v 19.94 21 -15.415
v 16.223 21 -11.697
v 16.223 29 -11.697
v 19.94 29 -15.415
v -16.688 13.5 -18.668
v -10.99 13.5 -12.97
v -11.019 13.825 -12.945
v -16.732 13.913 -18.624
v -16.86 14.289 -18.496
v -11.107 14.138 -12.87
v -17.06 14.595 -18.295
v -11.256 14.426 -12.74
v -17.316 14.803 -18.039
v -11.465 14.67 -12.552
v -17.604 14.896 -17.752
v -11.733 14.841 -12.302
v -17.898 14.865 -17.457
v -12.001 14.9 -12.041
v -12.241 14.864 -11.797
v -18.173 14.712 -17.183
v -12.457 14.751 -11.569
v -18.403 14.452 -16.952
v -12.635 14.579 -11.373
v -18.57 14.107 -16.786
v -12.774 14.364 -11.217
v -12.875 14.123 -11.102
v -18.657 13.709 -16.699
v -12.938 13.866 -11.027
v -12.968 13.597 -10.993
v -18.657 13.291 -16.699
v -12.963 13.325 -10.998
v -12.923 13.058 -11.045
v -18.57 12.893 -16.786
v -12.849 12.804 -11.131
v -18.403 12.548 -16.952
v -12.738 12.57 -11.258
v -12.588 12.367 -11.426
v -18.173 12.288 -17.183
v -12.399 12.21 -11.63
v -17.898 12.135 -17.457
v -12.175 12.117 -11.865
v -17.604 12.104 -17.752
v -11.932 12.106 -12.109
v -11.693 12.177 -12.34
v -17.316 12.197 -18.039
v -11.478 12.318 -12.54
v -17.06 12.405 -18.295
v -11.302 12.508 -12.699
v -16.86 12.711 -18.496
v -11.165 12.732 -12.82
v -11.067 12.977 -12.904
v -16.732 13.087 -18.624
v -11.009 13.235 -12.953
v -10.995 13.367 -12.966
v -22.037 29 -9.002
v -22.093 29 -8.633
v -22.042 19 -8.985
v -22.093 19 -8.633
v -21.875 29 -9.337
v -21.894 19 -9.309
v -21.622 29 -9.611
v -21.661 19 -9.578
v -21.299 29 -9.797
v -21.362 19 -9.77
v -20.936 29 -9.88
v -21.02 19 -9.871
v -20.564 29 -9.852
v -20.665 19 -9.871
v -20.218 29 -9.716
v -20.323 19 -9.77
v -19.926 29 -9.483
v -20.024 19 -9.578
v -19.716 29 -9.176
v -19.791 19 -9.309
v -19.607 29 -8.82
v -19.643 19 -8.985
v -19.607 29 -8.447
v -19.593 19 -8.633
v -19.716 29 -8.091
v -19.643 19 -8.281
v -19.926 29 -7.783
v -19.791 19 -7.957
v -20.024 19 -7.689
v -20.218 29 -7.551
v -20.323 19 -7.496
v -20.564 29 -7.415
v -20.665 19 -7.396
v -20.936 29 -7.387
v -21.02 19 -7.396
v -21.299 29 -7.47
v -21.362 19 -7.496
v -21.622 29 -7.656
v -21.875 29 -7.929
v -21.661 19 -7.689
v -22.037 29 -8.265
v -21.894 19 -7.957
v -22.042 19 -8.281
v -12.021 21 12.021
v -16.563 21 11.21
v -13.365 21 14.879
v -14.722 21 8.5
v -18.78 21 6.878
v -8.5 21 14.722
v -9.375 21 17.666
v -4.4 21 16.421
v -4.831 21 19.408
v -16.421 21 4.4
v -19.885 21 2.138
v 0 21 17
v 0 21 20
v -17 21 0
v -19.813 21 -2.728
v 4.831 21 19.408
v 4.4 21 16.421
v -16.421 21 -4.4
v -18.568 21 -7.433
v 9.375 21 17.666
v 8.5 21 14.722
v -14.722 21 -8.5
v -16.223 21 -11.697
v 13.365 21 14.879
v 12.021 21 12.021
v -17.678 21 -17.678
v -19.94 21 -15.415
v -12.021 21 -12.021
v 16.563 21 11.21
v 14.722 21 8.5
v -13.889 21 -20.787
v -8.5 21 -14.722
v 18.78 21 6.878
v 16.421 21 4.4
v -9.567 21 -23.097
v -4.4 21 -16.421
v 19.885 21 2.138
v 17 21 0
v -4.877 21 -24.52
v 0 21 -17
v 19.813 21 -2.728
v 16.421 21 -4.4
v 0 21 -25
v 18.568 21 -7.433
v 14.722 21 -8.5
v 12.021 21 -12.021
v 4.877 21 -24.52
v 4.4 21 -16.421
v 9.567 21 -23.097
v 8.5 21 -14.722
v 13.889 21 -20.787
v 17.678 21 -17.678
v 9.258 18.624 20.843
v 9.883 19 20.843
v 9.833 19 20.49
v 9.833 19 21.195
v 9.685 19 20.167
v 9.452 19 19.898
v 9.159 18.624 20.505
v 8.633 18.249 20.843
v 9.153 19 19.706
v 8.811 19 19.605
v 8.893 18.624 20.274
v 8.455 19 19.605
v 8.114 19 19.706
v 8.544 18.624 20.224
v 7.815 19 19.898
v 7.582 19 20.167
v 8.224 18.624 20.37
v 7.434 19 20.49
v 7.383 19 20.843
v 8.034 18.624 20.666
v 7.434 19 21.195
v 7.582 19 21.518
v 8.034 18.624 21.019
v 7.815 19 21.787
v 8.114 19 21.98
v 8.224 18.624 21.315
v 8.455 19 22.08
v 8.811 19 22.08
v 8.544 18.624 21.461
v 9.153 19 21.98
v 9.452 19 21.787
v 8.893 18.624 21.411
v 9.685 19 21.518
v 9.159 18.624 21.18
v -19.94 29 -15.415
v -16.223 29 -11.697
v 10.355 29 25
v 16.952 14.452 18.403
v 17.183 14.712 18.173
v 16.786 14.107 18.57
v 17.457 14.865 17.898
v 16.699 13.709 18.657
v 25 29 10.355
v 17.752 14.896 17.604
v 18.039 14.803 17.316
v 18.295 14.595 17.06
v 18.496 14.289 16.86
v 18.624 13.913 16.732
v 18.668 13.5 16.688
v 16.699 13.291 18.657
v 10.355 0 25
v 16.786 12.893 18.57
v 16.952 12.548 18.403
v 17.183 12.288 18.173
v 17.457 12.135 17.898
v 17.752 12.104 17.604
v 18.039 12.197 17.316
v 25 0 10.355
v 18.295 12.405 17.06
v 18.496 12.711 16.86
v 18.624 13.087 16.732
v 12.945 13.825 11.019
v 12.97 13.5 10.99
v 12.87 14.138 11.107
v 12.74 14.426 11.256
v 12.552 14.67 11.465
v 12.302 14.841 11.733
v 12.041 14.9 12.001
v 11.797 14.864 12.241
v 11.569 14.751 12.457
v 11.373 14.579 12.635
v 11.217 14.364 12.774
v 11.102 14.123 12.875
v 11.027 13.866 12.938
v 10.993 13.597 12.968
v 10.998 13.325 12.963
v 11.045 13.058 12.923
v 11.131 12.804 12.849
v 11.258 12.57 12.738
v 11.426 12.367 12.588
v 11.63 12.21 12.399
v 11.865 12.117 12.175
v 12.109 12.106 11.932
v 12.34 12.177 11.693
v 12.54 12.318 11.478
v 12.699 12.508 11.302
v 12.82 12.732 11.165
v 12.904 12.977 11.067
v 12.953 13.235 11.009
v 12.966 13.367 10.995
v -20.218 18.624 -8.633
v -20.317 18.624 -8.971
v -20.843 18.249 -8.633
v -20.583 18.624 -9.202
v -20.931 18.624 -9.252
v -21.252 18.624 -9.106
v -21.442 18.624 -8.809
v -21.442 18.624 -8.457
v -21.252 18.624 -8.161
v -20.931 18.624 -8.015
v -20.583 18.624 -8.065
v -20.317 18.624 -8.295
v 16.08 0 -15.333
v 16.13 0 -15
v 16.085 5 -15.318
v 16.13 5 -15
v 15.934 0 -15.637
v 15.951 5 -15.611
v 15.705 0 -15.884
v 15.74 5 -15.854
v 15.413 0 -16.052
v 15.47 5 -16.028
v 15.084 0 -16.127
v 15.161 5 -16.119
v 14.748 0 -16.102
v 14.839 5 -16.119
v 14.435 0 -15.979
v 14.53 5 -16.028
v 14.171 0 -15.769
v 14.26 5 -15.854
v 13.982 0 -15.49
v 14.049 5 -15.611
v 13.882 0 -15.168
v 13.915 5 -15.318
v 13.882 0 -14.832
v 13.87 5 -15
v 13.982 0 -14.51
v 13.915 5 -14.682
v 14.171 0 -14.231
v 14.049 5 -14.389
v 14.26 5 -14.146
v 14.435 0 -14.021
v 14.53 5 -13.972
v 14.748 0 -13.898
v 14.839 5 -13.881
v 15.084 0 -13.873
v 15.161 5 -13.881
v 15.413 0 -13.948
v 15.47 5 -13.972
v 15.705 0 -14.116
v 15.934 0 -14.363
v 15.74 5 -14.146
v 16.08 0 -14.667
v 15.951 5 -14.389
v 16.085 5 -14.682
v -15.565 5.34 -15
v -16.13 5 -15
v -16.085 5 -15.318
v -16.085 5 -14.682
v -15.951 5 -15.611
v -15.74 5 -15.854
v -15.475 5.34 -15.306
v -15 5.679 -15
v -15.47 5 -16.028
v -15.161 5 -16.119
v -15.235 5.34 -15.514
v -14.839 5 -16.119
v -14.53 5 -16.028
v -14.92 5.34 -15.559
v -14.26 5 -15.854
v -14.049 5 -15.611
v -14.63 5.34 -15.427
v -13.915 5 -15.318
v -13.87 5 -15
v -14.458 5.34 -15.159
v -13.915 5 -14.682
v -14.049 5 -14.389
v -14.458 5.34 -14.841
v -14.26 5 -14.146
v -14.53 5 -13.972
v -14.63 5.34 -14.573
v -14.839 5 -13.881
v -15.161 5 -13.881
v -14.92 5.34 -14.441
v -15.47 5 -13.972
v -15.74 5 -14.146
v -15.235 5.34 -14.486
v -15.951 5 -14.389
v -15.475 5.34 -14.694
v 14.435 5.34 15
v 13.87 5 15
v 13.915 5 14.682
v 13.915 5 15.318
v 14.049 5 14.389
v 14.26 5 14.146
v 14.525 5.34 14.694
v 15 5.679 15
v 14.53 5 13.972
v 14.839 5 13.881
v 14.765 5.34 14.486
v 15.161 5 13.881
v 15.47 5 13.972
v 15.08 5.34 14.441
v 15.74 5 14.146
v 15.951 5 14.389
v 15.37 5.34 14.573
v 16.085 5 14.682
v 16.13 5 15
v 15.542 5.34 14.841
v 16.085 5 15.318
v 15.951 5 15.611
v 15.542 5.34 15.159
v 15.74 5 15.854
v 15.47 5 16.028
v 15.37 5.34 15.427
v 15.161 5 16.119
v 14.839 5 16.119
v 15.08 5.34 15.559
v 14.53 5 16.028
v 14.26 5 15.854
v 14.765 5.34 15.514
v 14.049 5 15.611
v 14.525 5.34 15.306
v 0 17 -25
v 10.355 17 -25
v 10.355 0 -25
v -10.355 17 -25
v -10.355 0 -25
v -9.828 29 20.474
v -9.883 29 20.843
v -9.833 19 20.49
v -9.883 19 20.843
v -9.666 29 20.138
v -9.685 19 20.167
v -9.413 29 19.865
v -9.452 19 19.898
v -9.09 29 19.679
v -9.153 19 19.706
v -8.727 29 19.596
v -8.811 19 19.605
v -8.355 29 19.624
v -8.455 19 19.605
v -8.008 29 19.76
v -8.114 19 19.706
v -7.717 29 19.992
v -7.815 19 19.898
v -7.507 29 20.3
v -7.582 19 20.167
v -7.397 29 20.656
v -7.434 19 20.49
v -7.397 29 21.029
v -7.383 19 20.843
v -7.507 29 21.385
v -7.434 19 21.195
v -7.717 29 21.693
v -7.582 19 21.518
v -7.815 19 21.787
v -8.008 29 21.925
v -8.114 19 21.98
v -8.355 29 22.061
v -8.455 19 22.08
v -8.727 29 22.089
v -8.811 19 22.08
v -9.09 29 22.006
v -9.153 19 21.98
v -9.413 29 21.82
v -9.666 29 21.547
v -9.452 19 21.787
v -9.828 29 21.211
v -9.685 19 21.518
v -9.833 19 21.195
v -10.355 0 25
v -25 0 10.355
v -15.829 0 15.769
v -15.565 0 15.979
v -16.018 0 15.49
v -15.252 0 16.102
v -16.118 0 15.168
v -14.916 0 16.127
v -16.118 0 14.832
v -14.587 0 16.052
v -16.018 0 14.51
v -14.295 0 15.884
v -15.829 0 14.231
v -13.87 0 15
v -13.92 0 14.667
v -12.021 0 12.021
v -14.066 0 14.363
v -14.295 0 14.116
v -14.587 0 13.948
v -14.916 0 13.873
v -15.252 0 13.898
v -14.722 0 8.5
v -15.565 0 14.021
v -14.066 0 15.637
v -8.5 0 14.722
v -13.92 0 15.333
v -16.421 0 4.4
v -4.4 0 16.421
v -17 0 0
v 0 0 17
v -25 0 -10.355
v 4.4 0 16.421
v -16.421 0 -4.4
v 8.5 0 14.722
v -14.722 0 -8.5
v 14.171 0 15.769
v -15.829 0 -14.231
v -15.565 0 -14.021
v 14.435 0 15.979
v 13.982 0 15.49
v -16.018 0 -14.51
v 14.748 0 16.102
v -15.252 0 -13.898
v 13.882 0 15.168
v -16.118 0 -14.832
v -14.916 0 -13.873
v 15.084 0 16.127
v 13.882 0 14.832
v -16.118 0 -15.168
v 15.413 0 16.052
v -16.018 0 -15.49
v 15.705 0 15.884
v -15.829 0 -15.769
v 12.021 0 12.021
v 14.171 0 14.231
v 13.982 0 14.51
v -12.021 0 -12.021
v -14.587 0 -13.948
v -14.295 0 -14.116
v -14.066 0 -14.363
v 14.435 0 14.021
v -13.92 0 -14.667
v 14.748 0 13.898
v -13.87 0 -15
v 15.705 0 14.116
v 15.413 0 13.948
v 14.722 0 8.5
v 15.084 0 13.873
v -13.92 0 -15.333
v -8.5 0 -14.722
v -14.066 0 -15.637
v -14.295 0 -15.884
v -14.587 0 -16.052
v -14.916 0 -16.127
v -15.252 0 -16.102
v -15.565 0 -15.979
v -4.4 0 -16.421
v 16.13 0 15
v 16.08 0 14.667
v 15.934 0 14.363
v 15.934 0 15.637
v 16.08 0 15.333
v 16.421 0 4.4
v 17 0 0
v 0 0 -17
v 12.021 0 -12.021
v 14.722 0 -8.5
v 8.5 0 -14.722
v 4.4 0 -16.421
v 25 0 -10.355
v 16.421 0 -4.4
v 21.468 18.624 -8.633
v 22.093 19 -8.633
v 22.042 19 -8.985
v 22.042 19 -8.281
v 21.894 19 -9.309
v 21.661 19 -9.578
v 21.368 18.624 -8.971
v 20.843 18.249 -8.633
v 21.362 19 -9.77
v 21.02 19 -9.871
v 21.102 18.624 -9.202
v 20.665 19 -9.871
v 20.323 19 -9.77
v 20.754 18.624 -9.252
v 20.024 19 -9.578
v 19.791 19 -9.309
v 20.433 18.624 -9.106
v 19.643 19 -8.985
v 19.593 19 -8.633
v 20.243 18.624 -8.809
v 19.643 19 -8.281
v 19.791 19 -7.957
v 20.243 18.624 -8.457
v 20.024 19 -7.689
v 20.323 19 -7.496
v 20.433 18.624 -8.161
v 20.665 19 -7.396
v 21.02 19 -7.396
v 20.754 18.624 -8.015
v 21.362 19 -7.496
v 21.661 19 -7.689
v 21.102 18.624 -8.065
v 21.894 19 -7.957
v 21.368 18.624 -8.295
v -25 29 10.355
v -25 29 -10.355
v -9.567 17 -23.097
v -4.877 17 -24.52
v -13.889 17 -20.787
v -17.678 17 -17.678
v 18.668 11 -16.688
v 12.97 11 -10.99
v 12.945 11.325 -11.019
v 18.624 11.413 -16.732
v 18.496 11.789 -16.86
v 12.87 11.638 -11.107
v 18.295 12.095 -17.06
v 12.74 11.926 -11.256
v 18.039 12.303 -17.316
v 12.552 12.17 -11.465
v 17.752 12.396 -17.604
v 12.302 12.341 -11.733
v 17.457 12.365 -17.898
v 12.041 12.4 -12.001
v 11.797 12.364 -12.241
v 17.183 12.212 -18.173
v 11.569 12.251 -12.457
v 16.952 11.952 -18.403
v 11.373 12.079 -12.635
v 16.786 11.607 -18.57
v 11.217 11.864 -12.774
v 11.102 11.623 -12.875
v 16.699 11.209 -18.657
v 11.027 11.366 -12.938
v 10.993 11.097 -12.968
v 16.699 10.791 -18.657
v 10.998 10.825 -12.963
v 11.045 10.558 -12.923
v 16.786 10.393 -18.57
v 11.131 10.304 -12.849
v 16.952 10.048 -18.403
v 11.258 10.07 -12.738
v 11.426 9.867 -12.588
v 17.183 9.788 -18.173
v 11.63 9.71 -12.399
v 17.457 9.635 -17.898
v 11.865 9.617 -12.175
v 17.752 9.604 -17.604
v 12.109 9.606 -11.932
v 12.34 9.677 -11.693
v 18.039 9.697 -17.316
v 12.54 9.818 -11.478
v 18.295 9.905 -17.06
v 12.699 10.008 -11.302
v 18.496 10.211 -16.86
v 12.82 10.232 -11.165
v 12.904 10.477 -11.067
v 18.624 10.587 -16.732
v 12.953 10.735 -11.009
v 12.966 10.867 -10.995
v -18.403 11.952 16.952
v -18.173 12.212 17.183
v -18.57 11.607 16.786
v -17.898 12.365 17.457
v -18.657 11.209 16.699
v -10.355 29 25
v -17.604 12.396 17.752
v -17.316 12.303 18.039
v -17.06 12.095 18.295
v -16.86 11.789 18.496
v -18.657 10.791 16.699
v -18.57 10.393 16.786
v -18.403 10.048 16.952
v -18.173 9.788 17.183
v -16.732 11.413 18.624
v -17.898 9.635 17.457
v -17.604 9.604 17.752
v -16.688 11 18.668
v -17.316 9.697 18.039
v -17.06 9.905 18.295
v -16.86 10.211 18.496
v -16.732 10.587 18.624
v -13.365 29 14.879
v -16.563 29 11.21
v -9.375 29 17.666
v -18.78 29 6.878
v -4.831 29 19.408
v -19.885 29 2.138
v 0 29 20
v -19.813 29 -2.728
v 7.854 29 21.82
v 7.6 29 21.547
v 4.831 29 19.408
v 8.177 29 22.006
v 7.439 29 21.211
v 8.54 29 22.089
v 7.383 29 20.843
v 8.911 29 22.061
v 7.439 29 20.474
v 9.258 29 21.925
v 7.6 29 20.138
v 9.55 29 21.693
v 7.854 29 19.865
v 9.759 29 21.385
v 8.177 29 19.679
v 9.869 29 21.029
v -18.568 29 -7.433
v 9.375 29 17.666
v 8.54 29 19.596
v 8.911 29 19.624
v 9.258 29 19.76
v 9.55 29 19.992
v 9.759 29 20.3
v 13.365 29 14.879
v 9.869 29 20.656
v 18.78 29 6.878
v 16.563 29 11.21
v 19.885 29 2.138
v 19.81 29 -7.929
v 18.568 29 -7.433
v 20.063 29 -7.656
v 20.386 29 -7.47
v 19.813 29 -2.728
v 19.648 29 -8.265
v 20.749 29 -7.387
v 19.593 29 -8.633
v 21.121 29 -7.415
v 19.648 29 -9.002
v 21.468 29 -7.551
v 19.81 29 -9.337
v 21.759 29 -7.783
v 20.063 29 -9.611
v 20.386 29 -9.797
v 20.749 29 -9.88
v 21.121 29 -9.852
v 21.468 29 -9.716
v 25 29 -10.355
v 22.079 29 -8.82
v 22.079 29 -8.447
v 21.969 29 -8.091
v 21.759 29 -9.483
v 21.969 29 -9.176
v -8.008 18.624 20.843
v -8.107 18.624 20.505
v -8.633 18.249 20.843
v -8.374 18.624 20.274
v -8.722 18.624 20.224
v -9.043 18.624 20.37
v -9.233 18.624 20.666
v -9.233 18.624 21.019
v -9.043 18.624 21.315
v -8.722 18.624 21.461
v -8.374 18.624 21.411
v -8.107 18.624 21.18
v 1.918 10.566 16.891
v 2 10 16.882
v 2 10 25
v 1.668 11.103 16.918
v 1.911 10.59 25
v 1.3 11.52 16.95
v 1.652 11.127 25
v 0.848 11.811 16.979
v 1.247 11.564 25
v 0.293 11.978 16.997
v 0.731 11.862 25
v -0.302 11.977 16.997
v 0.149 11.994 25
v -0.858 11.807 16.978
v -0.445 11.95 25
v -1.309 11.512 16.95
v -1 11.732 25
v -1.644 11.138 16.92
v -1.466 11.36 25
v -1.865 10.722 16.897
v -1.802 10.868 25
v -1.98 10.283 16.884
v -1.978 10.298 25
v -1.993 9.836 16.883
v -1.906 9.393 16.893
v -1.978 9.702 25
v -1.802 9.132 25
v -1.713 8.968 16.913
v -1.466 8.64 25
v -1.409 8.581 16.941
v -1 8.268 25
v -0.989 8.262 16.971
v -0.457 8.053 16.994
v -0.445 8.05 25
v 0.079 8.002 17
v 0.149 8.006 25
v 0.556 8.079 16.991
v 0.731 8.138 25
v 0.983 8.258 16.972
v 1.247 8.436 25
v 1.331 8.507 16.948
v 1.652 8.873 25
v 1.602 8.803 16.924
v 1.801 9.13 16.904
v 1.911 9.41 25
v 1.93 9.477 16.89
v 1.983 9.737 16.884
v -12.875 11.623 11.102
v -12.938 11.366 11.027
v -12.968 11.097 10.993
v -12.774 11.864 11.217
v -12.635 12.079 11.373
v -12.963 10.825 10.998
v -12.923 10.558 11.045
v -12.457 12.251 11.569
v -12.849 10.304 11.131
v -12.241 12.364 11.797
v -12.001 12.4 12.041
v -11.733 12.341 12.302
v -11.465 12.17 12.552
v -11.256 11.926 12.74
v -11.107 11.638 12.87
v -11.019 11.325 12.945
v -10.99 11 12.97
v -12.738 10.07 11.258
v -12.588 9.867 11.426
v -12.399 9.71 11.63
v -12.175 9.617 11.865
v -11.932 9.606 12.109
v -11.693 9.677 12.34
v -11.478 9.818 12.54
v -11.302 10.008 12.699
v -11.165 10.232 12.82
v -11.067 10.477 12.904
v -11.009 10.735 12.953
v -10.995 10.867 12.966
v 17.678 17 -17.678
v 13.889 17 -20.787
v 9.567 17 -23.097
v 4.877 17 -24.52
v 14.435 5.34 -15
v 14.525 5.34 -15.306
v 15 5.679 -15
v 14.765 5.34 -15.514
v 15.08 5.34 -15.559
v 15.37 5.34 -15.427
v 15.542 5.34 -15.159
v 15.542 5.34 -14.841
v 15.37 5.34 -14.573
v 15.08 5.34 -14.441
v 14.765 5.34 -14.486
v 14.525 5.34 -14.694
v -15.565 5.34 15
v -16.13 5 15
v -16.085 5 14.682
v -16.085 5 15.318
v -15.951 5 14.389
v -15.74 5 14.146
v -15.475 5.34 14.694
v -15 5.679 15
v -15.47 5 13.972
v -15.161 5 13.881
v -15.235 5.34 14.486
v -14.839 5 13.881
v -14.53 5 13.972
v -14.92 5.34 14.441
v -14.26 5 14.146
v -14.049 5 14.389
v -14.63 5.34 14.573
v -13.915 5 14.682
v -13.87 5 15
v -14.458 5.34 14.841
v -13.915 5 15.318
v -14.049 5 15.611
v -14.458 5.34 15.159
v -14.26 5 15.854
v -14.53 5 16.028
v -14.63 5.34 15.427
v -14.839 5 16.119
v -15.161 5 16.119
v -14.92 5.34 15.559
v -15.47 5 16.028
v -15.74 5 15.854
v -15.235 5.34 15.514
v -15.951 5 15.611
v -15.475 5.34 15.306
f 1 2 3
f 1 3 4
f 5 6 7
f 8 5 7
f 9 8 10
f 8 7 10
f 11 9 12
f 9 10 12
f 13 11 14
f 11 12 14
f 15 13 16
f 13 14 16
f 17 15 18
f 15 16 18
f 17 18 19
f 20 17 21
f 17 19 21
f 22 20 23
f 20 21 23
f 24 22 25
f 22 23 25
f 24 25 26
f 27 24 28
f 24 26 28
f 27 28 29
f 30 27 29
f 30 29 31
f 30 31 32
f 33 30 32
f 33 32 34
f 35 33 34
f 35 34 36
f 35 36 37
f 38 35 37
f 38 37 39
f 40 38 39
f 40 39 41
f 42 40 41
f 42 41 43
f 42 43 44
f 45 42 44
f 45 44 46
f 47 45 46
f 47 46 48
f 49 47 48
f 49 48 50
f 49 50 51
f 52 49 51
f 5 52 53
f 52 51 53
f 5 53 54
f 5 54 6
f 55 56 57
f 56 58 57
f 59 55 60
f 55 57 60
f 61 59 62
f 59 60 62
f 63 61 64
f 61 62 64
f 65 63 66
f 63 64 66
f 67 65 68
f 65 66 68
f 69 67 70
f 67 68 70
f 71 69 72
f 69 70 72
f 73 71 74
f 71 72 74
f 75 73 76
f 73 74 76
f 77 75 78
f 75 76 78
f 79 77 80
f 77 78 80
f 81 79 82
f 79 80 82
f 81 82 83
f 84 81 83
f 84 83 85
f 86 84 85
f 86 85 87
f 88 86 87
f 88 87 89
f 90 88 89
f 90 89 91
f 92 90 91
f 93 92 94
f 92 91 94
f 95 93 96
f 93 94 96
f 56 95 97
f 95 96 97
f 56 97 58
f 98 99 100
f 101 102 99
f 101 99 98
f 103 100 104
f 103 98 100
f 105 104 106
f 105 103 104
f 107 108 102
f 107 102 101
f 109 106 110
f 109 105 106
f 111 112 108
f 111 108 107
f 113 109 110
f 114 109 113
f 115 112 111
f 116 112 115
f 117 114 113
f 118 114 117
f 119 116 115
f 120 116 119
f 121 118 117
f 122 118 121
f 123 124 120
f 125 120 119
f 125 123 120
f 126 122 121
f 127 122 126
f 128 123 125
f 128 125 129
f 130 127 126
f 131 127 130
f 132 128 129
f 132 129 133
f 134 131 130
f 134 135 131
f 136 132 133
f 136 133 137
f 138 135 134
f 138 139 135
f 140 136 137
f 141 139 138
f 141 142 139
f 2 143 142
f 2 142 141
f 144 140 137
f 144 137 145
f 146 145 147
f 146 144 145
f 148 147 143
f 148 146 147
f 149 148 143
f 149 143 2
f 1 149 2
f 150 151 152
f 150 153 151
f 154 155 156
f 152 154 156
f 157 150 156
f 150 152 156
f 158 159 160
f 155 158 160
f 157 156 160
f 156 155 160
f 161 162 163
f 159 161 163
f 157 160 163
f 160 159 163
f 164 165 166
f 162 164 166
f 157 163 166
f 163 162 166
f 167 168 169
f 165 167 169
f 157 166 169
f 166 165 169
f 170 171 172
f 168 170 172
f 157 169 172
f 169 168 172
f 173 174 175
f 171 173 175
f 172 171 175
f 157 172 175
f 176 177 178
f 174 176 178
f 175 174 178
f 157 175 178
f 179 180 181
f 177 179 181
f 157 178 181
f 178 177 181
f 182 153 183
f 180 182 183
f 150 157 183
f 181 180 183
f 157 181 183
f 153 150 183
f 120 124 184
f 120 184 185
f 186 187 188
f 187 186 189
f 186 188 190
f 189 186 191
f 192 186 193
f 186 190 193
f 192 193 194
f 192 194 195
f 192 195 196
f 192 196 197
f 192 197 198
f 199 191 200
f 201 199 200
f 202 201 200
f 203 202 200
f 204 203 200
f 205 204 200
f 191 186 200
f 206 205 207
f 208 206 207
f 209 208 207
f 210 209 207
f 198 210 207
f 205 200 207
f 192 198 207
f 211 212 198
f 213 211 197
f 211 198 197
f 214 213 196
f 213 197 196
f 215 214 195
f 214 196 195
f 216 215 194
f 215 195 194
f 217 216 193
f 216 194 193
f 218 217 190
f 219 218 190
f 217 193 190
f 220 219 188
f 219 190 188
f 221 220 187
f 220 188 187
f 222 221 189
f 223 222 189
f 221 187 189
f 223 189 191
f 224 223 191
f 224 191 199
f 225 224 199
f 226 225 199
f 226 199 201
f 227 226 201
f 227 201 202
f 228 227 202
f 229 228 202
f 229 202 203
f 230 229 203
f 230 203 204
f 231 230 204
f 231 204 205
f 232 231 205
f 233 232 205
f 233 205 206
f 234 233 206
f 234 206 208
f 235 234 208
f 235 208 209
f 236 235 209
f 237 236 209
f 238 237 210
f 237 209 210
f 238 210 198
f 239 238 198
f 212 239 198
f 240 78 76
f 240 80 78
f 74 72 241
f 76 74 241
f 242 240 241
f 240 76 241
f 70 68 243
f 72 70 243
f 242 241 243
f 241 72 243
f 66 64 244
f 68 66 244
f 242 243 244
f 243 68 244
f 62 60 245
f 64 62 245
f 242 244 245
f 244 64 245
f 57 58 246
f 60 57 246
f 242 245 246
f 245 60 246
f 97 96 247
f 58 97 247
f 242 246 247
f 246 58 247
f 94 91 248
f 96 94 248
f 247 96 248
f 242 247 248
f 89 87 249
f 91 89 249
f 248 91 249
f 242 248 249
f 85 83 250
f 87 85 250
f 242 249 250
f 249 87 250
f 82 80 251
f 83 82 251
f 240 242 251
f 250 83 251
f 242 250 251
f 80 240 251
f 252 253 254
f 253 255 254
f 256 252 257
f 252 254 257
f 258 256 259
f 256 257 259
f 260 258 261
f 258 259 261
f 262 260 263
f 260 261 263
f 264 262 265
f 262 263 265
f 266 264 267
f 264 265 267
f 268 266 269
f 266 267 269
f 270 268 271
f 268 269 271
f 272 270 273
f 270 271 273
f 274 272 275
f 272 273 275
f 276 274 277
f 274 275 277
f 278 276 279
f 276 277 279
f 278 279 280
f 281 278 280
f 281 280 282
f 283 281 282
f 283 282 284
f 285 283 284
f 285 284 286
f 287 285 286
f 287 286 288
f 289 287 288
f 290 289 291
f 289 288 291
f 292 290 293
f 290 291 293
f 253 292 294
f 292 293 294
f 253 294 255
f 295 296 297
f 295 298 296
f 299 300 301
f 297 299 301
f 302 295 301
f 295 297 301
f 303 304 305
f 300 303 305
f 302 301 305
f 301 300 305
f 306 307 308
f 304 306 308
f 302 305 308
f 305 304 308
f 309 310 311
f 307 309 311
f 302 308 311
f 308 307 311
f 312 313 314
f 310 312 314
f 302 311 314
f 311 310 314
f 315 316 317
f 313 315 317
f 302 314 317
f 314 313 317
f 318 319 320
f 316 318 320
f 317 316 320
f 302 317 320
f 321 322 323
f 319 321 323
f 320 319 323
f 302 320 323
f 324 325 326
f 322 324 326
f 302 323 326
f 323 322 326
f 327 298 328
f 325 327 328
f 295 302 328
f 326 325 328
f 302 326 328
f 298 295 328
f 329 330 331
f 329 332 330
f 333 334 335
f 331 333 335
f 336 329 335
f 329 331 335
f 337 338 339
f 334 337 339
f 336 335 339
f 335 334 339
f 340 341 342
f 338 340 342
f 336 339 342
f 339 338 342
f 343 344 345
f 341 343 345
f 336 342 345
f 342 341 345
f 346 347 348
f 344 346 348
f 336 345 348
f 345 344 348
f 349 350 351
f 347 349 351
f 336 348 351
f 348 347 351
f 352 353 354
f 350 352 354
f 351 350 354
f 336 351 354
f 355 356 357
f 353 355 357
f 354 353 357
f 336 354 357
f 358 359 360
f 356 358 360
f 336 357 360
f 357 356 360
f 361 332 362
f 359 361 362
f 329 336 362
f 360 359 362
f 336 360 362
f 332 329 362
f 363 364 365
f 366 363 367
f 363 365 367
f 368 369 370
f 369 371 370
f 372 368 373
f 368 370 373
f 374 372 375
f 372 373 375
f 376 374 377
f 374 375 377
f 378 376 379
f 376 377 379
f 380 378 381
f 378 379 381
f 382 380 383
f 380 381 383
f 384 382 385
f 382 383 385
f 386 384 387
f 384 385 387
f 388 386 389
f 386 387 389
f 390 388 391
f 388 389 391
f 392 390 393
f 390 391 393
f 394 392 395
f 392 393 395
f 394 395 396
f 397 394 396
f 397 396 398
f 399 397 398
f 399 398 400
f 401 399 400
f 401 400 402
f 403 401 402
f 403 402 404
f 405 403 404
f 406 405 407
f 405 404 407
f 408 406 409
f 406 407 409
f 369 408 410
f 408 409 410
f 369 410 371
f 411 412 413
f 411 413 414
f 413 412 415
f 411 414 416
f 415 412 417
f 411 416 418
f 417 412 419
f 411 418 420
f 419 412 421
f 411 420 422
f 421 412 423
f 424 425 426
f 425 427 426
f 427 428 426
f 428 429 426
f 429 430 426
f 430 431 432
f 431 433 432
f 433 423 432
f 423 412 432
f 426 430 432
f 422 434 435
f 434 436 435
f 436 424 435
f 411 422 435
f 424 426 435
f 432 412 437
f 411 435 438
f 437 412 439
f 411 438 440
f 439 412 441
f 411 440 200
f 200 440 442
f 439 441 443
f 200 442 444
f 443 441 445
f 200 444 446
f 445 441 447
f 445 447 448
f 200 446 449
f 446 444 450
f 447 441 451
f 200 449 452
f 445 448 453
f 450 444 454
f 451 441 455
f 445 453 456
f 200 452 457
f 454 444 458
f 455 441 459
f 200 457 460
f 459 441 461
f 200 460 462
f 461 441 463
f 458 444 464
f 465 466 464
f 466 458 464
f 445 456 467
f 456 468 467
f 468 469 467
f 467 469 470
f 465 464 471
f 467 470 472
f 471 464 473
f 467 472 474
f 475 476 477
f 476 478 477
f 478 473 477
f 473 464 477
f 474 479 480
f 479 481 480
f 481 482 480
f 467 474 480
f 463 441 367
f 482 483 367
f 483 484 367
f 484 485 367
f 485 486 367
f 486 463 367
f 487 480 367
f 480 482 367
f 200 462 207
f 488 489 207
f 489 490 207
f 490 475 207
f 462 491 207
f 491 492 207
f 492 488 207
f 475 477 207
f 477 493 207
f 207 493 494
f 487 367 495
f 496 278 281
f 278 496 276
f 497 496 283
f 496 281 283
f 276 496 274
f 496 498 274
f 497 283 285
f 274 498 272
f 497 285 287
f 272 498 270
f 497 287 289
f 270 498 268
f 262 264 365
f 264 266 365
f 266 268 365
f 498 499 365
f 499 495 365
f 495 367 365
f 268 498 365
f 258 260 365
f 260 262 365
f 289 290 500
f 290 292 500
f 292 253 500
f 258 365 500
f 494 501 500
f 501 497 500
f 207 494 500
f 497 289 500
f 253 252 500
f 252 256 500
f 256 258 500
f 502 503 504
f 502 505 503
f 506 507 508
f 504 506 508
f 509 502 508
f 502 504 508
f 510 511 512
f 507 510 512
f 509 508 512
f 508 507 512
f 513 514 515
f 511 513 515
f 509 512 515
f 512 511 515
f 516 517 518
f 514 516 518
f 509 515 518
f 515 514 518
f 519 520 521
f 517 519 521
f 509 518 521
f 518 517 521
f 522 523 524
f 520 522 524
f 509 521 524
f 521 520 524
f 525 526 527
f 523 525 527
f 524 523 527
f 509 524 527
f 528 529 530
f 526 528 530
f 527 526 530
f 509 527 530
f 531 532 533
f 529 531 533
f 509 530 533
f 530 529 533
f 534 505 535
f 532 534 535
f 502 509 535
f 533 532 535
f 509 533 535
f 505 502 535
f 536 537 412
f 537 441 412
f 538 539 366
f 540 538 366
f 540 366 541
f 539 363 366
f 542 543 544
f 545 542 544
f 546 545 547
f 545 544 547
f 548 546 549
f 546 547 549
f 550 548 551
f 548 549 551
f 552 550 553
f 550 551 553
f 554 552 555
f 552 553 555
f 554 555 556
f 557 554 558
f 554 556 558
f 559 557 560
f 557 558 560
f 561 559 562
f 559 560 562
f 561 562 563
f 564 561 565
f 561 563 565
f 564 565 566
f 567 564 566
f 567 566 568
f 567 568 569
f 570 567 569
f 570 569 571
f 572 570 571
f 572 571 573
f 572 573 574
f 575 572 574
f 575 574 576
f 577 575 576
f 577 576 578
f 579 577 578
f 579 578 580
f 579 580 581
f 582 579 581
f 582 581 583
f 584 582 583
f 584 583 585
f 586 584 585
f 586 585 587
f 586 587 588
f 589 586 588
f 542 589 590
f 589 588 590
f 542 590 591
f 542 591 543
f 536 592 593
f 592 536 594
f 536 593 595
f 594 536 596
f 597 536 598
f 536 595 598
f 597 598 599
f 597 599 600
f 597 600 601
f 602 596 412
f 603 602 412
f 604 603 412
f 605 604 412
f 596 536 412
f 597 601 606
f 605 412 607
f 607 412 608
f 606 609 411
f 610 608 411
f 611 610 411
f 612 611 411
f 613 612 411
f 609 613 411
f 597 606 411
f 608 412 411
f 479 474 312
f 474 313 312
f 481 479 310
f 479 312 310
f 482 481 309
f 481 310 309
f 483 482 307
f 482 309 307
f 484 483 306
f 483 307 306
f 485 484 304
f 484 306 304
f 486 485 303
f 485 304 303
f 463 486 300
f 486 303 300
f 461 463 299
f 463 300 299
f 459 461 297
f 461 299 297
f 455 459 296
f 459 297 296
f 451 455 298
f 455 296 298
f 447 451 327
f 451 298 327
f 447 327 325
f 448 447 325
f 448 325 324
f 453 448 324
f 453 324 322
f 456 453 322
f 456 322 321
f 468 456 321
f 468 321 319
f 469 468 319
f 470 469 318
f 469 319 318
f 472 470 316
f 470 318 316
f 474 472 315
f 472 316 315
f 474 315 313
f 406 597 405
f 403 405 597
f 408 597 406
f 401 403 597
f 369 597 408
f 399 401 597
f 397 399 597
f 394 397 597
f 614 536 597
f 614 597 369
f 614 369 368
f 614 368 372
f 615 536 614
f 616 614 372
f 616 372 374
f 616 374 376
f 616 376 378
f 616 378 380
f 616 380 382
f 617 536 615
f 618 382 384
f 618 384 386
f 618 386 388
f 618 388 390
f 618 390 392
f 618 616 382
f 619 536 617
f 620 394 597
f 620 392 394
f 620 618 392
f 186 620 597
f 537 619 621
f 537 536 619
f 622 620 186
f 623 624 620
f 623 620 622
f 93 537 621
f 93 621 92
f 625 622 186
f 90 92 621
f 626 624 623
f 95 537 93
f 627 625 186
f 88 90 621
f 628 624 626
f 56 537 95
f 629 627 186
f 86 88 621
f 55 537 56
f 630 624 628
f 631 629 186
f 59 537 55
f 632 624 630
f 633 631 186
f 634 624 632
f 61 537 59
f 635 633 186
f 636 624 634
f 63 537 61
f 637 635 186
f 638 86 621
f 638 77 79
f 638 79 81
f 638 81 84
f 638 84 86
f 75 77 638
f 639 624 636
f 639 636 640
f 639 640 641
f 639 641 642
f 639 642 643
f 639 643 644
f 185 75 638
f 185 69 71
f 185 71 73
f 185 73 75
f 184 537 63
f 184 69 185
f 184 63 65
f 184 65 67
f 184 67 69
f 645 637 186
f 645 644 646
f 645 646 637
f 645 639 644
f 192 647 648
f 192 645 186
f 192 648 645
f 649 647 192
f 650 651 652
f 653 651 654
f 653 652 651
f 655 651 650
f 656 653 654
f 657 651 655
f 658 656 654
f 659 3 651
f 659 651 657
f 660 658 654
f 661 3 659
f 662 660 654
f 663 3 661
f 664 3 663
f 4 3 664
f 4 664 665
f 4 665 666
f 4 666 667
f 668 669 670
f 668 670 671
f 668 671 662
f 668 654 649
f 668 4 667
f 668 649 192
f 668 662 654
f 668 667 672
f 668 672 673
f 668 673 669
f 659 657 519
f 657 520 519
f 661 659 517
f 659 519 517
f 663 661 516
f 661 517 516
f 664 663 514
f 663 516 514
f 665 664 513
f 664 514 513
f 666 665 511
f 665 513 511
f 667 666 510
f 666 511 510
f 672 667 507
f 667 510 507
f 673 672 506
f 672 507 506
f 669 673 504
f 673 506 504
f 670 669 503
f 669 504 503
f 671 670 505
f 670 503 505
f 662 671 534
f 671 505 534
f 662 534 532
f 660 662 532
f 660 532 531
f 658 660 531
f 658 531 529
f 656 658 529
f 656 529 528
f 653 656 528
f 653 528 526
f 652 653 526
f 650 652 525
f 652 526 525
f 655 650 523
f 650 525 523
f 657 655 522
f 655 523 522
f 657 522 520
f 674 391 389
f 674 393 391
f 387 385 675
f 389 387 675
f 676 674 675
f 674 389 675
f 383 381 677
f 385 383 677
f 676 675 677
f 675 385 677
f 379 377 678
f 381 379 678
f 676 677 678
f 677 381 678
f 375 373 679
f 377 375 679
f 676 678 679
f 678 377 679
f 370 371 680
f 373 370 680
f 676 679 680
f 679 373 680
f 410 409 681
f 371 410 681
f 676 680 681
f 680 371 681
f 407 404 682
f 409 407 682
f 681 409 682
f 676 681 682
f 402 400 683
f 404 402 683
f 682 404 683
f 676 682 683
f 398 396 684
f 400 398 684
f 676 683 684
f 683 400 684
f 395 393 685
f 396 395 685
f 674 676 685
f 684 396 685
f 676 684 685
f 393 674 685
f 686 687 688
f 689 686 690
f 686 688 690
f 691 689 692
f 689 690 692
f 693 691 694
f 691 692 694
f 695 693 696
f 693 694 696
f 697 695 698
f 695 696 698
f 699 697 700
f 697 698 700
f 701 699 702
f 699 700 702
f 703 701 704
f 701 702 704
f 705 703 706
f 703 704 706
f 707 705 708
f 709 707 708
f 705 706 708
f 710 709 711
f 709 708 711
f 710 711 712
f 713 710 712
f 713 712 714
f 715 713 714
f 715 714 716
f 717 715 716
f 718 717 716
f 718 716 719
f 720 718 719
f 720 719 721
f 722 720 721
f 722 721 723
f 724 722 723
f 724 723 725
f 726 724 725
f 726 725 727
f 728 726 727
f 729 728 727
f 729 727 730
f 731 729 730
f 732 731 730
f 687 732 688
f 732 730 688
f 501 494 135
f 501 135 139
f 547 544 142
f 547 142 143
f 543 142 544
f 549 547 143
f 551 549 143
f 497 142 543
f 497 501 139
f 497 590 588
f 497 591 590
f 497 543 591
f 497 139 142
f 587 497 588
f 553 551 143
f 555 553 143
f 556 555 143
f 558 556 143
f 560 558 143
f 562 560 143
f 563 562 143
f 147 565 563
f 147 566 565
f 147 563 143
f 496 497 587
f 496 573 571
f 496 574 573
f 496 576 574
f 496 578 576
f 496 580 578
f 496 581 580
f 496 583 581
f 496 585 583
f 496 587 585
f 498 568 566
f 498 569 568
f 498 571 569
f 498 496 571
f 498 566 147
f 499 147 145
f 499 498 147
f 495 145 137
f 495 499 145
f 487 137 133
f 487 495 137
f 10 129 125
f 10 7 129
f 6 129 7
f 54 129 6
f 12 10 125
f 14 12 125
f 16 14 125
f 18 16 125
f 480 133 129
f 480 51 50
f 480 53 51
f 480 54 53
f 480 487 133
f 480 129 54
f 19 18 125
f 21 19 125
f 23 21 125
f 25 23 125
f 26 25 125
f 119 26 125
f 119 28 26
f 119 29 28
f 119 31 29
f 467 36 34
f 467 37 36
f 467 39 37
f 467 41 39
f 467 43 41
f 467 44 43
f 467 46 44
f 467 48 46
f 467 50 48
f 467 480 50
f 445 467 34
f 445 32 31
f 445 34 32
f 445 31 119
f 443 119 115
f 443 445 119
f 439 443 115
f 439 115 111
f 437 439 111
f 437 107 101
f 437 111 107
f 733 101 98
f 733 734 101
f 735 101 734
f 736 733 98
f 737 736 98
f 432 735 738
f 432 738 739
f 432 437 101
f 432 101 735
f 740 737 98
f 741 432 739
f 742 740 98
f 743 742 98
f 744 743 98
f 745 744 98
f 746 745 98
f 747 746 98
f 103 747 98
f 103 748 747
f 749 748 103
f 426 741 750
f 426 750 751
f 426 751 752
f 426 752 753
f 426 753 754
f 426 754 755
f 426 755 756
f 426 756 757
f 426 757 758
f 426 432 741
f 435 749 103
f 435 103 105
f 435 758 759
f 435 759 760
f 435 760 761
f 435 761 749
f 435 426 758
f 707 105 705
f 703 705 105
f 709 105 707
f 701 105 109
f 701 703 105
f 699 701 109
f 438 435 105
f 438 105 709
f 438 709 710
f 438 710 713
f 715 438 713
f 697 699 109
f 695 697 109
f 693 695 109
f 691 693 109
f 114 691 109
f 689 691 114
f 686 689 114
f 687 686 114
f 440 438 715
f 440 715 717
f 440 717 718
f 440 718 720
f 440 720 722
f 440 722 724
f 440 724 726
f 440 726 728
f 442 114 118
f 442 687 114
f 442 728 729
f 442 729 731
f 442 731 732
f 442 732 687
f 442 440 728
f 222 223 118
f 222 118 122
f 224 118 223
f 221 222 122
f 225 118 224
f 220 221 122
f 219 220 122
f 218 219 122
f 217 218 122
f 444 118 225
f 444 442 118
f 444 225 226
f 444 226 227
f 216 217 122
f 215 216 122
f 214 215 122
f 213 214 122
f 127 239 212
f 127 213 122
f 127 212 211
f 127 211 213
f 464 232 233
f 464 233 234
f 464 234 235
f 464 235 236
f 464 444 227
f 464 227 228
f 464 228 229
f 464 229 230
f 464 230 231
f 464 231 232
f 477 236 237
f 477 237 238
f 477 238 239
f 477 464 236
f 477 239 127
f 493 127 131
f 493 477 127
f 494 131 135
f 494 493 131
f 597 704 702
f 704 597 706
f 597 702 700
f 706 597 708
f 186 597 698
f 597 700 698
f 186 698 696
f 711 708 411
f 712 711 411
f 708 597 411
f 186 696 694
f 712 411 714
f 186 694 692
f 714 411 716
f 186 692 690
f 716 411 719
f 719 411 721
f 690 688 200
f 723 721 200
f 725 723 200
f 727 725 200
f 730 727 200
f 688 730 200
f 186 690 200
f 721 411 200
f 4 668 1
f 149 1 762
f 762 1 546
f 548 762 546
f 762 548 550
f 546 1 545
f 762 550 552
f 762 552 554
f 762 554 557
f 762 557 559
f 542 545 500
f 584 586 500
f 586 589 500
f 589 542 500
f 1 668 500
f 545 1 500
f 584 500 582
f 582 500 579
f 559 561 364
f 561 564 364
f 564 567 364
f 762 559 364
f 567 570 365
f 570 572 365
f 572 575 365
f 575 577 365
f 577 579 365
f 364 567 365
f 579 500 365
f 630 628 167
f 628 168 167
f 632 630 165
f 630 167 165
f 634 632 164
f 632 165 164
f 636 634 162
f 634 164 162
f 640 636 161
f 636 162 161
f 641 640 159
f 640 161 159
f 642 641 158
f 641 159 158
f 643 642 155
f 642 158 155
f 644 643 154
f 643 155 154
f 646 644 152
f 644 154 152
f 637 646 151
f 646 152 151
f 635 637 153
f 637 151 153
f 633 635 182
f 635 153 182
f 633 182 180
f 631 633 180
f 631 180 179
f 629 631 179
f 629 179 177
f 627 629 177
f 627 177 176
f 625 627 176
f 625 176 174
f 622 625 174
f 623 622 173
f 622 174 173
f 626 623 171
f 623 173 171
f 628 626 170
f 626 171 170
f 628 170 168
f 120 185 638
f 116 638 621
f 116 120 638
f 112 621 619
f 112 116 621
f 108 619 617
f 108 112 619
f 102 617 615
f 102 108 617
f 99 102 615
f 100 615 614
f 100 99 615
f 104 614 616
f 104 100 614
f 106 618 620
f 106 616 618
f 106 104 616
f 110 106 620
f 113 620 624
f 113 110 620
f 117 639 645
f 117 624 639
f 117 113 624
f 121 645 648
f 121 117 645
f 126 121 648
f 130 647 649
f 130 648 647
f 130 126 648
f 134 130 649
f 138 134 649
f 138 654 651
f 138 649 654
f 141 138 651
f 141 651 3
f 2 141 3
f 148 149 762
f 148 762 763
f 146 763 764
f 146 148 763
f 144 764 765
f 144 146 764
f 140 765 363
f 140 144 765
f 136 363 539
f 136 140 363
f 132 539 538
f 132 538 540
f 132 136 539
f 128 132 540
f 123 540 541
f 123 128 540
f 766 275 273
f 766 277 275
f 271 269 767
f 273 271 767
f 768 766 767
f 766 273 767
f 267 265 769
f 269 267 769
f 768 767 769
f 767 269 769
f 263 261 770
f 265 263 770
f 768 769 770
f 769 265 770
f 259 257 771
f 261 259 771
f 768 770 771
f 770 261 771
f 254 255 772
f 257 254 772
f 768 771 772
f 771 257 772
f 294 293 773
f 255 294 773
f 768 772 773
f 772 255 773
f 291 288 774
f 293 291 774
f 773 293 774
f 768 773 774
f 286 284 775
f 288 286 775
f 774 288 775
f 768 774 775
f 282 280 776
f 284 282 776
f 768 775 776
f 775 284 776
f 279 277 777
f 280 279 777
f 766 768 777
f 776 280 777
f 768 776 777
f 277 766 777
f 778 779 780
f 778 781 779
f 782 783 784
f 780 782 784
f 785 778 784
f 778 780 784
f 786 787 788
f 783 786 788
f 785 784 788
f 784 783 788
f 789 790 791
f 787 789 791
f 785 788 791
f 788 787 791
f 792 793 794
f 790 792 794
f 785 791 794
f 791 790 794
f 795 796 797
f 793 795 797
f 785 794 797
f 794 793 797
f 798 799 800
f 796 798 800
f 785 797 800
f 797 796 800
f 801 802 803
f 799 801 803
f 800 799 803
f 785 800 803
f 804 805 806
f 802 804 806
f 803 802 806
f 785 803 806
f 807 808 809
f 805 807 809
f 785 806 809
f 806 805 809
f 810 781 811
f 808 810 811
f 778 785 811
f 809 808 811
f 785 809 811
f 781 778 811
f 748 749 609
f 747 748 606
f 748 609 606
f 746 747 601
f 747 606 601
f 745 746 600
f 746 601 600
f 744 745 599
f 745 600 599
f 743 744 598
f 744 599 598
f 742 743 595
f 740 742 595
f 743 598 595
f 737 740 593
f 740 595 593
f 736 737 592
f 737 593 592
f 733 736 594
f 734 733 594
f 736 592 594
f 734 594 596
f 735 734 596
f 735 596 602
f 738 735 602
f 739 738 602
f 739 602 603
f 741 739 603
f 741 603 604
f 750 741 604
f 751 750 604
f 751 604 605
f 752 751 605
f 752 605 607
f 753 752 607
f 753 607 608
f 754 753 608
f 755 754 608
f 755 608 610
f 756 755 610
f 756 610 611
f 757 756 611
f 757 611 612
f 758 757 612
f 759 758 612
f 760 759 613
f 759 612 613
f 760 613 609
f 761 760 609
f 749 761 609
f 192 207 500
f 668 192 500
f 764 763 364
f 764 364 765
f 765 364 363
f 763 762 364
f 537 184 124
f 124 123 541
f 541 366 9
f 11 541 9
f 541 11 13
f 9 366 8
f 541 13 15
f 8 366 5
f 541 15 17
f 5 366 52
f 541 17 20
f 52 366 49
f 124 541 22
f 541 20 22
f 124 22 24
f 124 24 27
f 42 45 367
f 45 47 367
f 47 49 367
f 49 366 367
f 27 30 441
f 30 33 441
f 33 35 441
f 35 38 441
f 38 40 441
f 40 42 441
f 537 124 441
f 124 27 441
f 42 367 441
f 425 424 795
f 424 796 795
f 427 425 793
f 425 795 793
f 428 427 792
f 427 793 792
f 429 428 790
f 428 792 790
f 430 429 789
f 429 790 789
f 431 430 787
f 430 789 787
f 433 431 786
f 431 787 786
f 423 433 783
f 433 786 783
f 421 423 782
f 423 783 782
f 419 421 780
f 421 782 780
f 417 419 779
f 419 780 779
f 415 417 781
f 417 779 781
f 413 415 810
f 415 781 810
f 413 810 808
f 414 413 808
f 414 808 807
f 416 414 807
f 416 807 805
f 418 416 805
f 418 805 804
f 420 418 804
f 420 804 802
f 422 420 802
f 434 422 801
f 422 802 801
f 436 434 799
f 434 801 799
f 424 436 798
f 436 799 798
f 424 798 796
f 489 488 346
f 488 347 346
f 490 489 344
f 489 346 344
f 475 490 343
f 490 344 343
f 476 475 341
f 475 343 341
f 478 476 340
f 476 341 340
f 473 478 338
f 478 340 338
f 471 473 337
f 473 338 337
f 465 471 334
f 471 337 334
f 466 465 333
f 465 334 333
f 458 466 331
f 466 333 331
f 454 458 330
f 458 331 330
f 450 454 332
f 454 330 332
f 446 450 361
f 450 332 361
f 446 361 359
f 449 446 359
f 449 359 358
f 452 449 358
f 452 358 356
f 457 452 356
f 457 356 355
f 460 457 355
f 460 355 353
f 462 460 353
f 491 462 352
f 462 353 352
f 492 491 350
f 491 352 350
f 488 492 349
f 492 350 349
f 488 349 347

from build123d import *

# Parameters (mm, degrees)
SKETCH1_R                 = 17
BOSS_EXTRUDE1_DEPTH       = 21
SKETCH2_R                 = 20
BOSS_EXTRUDE2_DEPTH       = 8
CUT_EXTRUDE3_DEPTH        = 8
M3_TAPPED_HOLE1_D         = 2.5
M3_TAPPED_HOLE1_DEPTH     = 10
M3_TAPPED_HOLE1_TIP       = 0.751075774
F_4_40_TAPPED_HOLE1_D     = 2.2606
F_4_40_TAPPED_HOLE1_DEPTH = 5
F_4_40_TAPPED_HOLE1_TIP   = 0.679152758
M3X0_2_TAPPED_HOLE1_D     = 2.8
M3X0_2_TAPPED_HOLE2_D     = 2.8
CUT_EXTRUDE4_REACH        = 52
SKETCH20_R                = 2
CUT_EXTRUDE5_DEPTH        = 12


with BuildPart() as part:
    # Sketch1 → Boss-Extrude1 (new body)
    with BuildSketch(Plane(origin=(0, 0, 0), x_dir=(1, 0, 0), z_dir=(0, 1, 0))):
        Polygon((10.355339059, 25), (-10.355339059, 25), (-25, 10.355339059), (-25, -10.355339059), (-10.355339059, -25), (10.355339059, -25), (25, -10.355339059), (25, 10.355339059), align=None)
        Circle(SKETCH1_R, mode=Mode.SUBTRACT)
    extrude(amount=BOSS_EXTRUDE1_DEPTH)

    # Sketch2 → Boss-Extrude2 (add)
    with BuildSketch(Plane(origin=(0, 21, 0), x_dir=(1, 0, 0), z_dir=(0, 1, 0))):
        Polygon((25, 10.355339059), (10.355339059, 25), (-10.355339059, 25), (-25, 10.355339059), (-25, -10.355339059), (-10.355339059, -25), (10.355339059, -25), (25, -10.355339059), align=None)
        Circle(SKETCH2_R, mode=Mode.SUBTRACT)
    extrude(amount=BOSS_EXTRUDE2_DEPTH)

    # Sketch6 → Cut-Extrude3 (cut)
    with BuildSketch(Plane(origin=(0, 29, 0), x_dir=(1, 0, 0), z_dir=(0, 1, 0))):
        Polygon((-19.940411229, 15.41492783), (-16.222684393, 11.697200993), (16.222684393, 11.697200993), (19.940411229, 15.41492783), (10.355339059, 25), (-10.355339059, 25), align=None)
    extrude(amount=-CUT_EXTRUDE3_DEPTH, mode=Mode.SUBTRACT)

    # M3 Tapped Hole1
    with Locations(Plane(origin=(0, 29, 0), x_dir=(1, 0, 0), z_dir=(0, 1, 0))):
        with Locations((20.842542104, 8.633263614), (-20.842542104, 8.633263614), (-8.633263614, -20.842542104), (8.633263614, -20.842542104)):
            Hole(M3_TAPPED_HOLE1_D / 2, depth=M3_TAPPED_HOLE1_DEPTH)
            with Locations((0, 0, -(M3_TAPPED_HOLE1_DEPTH + M3_TAPPED_HOLE1_TIP / 2))):  # 118° drill point
                Cone(0, M3_TAPPED_HOLE1_D / 2, M3_TAPPED_HOLE1_TIP, mode=Mode.SUBTRACT)

    # #4-40 Tapped Hole1
    with Locations(Plane(origin=(0, 0, 0), x_dir=(-1, 0, 0), z_dir=(0, -1, 0))):
        with Locations((-15, 15), (15, 15), (-15, -15), (15, -15)):
            Hole(F_4_40_TAPPED_HOLE1_D / 2, depth=F_4_40_TAPPED_HOLE1_DEPTH)
            with Locations((0, 0, -(F_4_40_TAPPED_HOLE1_DEPTH + F_4_40_TAPPED_HOLE1_TIP / 2))):  # 118° drill point
                Cone(0, F_4_40_TAPPED_HOLE1_D / 2, F_4_40_TAPPED_HOLE1_TIP, mode=Mode.SUBTRACT)

    # M3x0.2 Tapped Hole1 (through all)
    with Locations(Plane(origin=(17.67766953, 0, -17.67766953), x_dir=(-0.707106781, 0, -0.707106781), z_dir=(0.707106781, 0, -0.707106781))):
        with Locations((0, 11)):
            Hole(M3X0_2_TAPPED_HOLE1_D / 2)

    # M3x0.2 Tapped Hole2 (through all)
    with Locations(Plane(origin=(-17.67766953, 0, -17.67766953), x_dir=(-0.707106781, 0, 0.707106781), z_dir=(-0.707106781, 0, -0.707106781))):
        with Locations((0, 13.5)):
            Hole(M3X0_2_TAPPED_HOLE2_D / 2)

    # Sketch20 → Cut-Extrude4 (cut, up to next)
    with BuildSketch(Plane.XY.offset(25), mode=Mode.PRIVATE) as cut_extrude4_sk1:
        with Locations((0, 10)):
            Circle(SKETCH20_R)
    cut_extrude4_tool1 = extrude(cut_extrude4_sk1.sketch, amount=-CUT_EXTRUDE4_REACH, mode=Mode.PRIVATE) & part.part
    add(cut_extrude4_tool1.solids().sort_by_distance((0, 10, 25))[0], mode=Mode.SUBTRACT)

    # Sketch22 → Cut-Extrude5 (cut)
    with BuildSketch(Plane(origin=(0, 29, 0), x_dir=(1, 0, 0), z_dir=(0, 1, 0))):
        with BuildLine():
            Line((-17.67766953, 17.67766953), (-17.67766953, 26.402318696))
            Line((-17.67766953, 26.402318696), (17.67766953, 26.402318696))
            Line((17.67766953, 26.402318696), (17.67766953, 17.67766953))
            ThreePointArc((17.67766953, 17.67766953), (0, 25), (-17.67766953, 17.67766953))
        make_face()
    extrude(amount=-CUT_EXTRUDE5_DEPTH, mode=Mode.SUBTRACT)


solid = part.part
